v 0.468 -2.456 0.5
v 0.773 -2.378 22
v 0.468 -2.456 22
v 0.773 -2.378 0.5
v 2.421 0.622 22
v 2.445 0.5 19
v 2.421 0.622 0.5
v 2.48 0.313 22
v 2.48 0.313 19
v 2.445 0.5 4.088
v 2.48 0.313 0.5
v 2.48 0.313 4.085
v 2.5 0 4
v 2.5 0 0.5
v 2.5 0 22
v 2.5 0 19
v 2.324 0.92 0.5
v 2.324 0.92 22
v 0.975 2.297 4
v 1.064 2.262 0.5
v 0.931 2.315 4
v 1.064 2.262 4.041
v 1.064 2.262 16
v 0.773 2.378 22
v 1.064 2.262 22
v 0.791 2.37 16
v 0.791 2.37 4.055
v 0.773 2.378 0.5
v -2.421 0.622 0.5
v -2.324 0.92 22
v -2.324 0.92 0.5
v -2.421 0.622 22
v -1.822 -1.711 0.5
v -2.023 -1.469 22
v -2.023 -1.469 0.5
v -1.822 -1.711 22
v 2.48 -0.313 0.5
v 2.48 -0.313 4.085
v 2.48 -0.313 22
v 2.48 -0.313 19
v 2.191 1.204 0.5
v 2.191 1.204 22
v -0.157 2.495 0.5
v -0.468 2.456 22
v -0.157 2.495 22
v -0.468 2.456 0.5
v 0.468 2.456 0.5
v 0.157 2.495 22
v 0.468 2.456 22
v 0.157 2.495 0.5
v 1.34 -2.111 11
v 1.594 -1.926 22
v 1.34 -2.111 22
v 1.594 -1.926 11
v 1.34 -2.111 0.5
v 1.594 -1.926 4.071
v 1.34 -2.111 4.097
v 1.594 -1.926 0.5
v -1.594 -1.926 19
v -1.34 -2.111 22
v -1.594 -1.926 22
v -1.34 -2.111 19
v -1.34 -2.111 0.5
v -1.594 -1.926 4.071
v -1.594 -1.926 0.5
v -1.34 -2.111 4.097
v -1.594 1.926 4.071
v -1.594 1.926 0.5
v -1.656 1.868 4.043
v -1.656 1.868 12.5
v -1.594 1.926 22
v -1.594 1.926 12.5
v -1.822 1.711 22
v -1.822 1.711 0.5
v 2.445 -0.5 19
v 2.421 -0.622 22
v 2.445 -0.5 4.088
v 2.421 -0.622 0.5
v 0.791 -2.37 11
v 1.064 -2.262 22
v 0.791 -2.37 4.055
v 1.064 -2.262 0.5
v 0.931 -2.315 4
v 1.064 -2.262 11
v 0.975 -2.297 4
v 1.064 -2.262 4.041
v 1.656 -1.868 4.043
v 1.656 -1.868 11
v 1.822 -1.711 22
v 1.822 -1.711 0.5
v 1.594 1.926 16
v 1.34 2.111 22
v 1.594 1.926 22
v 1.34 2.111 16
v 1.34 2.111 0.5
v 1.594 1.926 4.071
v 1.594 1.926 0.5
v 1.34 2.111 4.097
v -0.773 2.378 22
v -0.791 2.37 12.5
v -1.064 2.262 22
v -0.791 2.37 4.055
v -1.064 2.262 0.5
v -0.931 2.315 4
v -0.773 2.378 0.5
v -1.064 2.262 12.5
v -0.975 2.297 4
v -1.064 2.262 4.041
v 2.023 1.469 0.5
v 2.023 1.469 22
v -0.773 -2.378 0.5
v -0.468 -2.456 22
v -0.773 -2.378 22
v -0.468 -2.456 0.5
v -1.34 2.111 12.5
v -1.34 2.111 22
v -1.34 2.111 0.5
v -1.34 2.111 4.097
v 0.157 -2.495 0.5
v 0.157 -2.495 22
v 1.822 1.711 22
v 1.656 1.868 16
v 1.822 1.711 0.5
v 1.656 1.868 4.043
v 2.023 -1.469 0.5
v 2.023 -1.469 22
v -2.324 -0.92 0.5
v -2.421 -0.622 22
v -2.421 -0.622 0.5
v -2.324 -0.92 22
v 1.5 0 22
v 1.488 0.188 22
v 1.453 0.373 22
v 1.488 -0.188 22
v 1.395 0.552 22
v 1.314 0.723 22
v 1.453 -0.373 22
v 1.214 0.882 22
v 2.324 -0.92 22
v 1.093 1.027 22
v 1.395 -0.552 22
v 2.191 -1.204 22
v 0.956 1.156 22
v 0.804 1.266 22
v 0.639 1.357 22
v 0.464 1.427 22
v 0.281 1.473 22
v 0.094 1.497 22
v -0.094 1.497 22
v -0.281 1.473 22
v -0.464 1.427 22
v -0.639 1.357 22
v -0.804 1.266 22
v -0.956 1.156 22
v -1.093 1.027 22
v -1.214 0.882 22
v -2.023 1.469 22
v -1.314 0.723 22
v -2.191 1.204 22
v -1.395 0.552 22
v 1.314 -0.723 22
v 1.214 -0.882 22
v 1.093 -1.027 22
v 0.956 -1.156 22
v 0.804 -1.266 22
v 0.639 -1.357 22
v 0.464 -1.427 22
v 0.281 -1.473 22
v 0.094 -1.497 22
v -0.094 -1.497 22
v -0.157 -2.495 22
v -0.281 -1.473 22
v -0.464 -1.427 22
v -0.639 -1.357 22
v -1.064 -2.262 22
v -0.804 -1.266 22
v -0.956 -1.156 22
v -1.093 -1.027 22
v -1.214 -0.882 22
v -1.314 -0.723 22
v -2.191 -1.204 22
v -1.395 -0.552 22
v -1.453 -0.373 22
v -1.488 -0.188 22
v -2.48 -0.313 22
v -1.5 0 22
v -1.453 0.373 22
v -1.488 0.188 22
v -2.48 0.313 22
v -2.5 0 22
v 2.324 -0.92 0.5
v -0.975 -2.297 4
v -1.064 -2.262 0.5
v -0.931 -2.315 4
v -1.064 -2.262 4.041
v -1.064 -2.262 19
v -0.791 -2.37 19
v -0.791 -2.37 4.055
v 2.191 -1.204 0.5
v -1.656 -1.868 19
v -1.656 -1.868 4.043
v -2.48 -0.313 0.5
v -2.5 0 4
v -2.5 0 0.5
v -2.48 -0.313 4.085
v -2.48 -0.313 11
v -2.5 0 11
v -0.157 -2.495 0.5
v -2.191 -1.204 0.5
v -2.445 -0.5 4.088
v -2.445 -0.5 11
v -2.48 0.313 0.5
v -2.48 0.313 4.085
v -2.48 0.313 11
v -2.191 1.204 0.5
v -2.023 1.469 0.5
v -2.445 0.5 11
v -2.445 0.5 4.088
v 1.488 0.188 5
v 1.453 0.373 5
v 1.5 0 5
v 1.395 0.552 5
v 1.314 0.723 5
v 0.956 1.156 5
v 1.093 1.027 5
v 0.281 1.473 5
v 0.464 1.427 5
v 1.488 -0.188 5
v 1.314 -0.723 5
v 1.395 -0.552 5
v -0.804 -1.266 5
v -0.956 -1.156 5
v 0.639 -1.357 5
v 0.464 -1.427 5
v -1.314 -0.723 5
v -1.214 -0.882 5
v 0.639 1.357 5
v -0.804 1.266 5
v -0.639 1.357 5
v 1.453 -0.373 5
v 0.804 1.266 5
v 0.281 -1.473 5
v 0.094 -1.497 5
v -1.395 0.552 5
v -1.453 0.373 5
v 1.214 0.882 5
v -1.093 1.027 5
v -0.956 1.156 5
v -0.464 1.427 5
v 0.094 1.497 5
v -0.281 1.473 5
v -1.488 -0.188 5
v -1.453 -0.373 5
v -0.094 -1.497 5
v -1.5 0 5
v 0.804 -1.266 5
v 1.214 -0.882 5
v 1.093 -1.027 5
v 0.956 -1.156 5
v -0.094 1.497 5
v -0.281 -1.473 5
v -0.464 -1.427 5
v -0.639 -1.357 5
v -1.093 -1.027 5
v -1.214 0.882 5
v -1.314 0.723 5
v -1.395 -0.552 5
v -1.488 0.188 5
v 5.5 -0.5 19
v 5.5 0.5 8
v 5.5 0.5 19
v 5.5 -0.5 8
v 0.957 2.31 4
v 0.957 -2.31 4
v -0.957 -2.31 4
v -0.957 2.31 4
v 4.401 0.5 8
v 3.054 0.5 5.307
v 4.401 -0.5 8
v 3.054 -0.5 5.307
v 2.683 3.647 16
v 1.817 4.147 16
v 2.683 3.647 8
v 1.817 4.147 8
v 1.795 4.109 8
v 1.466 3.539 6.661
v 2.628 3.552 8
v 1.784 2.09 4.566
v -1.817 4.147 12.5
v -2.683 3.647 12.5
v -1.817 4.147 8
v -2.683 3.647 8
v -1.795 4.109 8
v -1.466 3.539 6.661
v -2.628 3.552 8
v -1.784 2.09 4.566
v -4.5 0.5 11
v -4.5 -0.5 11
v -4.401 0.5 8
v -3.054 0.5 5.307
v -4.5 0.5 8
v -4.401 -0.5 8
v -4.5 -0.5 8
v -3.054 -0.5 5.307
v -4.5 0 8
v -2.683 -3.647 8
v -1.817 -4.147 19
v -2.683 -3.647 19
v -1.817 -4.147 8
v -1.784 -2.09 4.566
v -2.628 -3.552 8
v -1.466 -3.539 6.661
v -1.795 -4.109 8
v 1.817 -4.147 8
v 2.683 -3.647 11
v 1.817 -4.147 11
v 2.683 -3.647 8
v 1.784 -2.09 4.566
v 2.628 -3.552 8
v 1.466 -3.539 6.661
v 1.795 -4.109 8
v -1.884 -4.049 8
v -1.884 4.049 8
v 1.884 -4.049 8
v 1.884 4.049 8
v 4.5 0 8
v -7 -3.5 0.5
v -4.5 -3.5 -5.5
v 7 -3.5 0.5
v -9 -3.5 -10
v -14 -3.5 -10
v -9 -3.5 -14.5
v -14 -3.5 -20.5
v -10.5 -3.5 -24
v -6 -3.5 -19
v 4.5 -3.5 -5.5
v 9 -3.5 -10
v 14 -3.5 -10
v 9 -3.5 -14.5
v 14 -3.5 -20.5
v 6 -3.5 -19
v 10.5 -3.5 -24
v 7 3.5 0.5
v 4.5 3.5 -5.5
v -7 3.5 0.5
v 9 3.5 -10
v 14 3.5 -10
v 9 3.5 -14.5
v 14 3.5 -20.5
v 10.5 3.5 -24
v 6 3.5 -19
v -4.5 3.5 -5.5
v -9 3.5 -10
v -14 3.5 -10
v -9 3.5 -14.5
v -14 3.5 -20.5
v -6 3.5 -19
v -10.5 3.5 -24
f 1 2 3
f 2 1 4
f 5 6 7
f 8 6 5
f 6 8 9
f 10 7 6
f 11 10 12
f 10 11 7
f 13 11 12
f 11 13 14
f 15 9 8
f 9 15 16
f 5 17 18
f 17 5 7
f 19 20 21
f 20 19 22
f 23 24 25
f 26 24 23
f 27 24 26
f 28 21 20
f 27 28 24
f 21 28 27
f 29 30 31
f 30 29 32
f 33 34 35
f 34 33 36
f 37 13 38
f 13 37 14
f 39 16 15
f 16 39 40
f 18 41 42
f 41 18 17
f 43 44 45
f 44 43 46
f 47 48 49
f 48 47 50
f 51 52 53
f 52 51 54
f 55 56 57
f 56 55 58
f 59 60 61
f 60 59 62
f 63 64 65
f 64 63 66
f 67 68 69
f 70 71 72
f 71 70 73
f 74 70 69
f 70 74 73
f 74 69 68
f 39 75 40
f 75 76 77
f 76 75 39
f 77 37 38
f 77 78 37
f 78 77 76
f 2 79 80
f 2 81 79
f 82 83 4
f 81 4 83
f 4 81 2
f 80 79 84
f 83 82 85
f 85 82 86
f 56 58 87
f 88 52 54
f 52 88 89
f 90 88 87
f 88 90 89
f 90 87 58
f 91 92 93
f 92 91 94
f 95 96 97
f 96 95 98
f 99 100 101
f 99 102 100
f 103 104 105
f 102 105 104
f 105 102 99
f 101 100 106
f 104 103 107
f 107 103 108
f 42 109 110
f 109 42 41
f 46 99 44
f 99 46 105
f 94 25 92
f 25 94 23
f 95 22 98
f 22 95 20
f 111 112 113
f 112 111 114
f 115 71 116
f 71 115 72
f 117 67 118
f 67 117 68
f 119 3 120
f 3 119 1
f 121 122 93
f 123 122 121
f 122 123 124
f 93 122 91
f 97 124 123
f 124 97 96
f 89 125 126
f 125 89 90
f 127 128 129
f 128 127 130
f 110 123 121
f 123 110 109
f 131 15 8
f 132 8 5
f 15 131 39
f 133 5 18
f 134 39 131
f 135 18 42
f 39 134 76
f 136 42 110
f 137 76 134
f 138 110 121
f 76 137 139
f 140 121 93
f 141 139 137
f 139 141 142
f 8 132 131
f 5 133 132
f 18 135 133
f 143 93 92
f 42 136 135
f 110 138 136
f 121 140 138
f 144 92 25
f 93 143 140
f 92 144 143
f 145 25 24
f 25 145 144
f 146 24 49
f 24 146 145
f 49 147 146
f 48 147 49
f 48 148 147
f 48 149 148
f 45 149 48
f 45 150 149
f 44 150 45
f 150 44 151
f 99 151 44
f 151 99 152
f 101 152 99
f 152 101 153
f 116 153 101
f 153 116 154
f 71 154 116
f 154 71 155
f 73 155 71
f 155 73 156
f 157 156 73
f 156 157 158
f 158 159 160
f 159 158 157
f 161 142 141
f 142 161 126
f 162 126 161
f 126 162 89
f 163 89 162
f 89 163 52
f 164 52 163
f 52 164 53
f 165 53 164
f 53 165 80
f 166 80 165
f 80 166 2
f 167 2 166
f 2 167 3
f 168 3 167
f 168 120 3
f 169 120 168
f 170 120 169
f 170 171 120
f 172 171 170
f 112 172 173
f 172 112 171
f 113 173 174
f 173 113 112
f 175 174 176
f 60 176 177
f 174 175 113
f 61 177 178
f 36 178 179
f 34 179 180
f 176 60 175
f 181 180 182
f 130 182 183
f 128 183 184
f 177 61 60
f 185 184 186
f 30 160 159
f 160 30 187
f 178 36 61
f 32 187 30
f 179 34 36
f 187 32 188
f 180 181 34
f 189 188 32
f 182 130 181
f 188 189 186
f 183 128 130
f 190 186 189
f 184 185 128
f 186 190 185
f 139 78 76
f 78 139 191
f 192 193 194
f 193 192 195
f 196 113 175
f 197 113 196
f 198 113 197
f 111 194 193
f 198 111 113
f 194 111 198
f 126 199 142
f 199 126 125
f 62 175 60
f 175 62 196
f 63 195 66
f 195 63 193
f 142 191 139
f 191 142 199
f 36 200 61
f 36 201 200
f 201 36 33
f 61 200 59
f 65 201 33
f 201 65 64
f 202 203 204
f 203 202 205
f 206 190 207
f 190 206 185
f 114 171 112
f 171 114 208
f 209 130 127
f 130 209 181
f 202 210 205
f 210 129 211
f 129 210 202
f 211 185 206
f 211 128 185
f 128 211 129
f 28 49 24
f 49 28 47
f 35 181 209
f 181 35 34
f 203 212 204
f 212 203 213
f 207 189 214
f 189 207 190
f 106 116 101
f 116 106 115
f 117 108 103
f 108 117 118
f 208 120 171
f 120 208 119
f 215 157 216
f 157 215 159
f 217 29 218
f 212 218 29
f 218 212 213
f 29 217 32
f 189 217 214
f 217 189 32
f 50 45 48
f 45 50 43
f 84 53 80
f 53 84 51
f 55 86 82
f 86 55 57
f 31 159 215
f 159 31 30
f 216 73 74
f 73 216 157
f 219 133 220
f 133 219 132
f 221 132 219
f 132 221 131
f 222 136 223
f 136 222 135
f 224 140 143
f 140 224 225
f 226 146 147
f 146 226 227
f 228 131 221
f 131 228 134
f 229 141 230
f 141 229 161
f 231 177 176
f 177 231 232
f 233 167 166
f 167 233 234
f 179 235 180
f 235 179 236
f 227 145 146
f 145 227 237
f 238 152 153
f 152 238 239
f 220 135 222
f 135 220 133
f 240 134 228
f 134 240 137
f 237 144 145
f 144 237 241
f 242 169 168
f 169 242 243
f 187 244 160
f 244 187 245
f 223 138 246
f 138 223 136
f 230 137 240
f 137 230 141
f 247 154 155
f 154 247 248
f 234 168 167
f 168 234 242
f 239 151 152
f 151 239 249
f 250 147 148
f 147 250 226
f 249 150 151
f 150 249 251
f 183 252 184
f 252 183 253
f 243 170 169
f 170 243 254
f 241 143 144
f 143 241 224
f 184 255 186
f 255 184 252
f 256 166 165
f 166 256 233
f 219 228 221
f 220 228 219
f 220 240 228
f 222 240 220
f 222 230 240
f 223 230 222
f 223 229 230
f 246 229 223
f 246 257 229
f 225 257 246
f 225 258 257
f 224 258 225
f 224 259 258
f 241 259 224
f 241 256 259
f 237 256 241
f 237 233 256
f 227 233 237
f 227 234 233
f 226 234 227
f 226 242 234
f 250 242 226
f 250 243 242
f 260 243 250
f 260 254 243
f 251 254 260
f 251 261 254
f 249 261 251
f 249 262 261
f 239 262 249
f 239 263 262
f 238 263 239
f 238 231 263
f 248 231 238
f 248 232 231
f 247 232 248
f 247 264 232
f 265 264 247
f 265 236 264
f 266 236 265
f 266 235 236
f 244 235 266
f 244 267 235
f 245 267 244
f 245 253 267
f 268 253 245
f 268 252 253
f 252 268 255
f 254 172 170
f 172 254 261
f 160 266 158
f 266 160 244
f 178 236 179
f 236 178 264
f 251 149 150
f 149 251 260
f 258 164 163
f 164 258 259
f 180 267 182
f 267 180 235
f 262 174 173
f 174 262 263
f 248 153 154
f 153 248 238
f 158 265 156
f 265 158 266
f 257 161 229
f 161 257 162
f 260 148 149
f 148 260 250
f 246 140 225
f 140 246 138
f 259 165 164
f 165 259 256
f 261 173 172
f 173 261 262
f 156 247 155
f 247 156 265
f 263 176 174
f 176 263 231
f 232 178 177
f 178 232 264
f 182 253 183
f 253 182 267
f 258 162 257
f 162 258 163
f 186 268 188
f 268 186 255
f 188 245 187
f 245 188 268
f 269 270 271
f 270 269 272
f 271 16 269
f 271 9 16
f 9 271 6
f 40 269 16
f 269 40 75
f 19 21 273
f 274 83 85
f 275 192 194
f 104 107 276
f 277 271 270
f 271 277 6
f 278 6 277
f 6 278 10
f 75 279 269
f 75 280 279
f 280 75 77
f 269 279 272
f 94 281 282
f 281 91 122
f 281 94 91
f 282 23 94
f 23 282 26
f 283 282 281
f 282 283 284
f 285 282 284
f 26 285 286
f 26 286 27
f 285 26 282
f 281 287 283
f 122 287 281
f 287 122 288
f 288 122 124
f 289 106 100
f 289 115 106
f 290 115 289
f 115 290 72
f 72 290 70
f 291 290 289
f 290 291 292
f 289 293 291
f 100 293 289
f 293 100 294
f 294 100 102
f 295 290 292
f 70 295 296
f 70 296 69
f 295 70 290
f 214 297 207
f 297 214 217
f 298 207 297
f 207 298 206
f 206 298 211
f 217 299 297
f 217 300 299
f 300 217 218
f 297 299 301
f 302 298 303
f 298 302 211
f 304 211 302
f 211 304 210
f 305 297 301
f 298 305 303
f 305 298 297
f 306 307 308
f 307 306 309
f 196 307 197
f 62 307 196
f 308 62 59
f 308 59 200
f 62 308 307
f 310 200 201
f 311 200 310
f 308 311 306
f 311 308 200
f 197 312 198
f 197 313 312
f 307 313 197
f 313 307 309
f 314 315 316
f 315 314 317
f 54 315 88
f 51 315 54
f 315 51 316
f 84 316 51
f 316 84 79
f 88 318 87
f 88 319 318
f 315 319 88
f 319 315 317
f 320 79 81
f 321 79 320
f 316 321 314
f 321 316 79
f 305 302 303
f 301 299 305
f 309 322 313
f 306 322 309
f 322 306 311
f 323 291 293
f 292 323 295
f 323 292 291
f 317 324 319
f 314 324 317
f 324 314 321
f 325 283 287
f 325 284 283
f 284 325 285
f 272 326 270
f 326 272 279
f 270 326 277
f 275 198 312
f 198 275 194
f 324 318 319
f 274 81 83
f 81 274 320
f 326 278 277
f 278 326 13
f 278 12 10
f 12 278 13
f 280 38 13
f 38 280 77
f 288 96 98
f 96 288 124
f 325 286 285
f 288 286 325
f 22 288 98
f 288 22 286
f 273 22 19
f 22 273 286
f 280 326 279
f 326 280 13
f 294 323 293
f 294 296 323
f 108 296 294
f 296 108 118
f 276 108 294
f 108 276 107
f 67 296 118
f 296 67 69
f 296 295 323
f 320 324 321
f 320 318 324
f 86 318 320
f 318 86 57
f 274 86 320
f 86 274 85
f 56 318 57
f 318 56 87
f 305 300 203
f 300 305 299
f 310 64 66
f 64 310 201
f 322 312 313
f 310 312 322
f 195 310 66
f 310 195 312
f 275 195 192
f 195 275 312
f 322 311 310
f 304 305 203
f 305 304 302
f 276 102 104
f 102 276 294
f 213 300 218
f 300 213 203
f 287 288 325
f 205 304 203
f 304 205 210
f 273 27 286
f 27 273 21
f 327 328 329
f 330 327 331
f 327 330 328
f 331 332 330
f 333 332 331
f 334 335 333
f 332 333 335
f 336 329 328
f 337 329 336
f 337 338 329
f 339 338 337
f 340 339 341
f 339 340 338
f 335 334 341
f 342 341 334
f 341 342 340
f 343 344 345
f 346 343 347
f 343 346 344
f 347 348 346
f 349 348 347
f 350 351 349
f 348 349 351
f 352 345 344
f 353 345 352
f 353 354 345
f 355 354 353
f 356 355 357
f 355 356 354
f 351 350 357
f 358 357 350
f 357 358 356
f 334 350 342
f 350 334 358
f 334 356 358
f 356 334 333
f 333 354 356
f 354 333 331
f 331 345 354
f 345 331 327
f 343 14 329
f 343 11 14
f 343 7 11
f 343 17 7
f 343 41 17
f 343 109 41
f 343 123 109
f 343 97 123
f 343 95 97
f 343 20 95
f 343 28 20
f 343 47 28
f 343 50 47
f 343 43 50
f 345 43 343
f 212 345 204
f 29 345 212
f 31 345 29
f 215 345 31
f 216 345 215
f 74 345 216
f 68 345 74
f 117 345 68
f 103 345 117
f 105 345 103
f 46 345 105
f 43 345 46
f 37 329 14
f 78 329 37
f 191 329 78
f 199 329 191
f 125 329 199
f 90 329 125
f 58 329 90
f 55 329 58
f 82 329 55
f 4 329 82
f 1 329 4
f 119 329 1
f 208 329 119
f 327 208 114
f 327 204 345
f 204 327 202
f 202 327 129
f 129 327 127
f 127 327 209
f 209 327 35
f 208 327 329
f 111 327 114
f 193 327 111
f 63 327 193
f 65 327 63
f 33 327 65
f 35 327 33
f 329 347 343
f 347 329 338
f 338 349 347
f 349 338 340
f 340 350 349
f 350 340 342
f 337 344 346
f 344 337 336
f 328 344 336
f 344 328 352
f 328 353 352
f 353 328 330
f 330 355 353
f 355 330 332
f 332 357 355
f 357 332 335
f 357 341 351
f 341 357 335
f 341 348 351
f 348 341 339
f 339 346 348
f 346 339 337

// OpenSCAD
// Documentation Générer une clef Pollux 5
// =========================
//
// création d'une copie d'une clef Pollux basée sur les coupes en mm
// paramètres :
// un, deux, trois, quatre, cinq
//
// manche: bool, de base true si on le specifie à false, créer un petit manche pour des impréssions plus rapide
//
// Vue de face de la clef :
//
//          3
//       4     2
//          
//       5     1
//         |_|
//
// Utilisation:
// ------
//
// appel du module :
//
//     clef_pollux5(un, deux, trois, quatre, cinq);
//
// Example:
// --------
//
//     clef_pollux5(8,0,8,6.5);
//     clef_pollux5(8,0,8,6.5, manche=false);

module clef_pollux5(un, deux, trois, quatre, cinq, manche=true){
    union() {
       rotate([0,0,90]){ 
            if (manche) {
                // Handle
                rotate([0, 90, 0]) translate([10, 0, - 3.5]) {
                    linear_extrude(7) {
                        difference() {
                            scale(0.7) polygon(points = [[- 15, - 10], [0, - 20], [15, - 20], [20, - 15], [20, 15], [15, 20]
                                , [0, 20], [- 15, 10]]);
                            scale(0.3) polygon(points = [[- 15, - 15], [0, - 30], [15, - 30], [30, - 20], [30, 20], [15, 30]
                                , [0, 30], [- 15, 15]]);
                        }
                    }
                }
            }
            else {
                //small handle
                translate([- 4, - 7, - 5]) cube([8, 14, 5]);
            }
        }
        // shape kiz
            difference() {
                cylinder(22, 2.5, 2.5, $fn = 50);  // Outer cylinder
                translate([0,0,5]) cylinder(18, 1.5, 1.5, $fn = 50);  // Inner cylinder
            }
            // ajout des barres de combinaison de la clef ( 6 barres, 360°/6 pour l'angle de rotation entre chaque barre la 1 est l'entraineur)
            translate([0,0,4]){
                blankHeight = 12 + 3; // 14 is the blank size, 3 is the already cut part on the key
                 // barre 1
                
        difference(){
            union() {
                translate([2,-0.5,0]) cube([3.5, 1, blankHeight]);
                // barre 2
                rotate([0,0,60]) translate([2,-0.5,0]) cube([2.5, 1, blankHeight-cinq]);
                // barre 3
                rotate([0,0,60*2]) translate([2,-0.5,0]) cube([2.5, 1, blankHeight-quatre]);
                // barre 4
                rotate([0,0,60*3]) translate([2,-0.5,0]) cube([2.5, 1, blankHeight-trois]);
                // barre 5
                rotate([0,0,60*4]) translate([2,-0.5,0]) cube([2.5, 1, blankHeight-deux]);
            // barre 6
                rotate([0,0,60*5]) translate([2,-0.5,0]) cube([2.5, 1, blankHeight-un]);
            }
            
        difference(){
            cylinder(4,6,6);
            cylinder(5,2.5,5);
            }
        }
    }}
}

clef_pollux5(8,0,8,6.5,3);
